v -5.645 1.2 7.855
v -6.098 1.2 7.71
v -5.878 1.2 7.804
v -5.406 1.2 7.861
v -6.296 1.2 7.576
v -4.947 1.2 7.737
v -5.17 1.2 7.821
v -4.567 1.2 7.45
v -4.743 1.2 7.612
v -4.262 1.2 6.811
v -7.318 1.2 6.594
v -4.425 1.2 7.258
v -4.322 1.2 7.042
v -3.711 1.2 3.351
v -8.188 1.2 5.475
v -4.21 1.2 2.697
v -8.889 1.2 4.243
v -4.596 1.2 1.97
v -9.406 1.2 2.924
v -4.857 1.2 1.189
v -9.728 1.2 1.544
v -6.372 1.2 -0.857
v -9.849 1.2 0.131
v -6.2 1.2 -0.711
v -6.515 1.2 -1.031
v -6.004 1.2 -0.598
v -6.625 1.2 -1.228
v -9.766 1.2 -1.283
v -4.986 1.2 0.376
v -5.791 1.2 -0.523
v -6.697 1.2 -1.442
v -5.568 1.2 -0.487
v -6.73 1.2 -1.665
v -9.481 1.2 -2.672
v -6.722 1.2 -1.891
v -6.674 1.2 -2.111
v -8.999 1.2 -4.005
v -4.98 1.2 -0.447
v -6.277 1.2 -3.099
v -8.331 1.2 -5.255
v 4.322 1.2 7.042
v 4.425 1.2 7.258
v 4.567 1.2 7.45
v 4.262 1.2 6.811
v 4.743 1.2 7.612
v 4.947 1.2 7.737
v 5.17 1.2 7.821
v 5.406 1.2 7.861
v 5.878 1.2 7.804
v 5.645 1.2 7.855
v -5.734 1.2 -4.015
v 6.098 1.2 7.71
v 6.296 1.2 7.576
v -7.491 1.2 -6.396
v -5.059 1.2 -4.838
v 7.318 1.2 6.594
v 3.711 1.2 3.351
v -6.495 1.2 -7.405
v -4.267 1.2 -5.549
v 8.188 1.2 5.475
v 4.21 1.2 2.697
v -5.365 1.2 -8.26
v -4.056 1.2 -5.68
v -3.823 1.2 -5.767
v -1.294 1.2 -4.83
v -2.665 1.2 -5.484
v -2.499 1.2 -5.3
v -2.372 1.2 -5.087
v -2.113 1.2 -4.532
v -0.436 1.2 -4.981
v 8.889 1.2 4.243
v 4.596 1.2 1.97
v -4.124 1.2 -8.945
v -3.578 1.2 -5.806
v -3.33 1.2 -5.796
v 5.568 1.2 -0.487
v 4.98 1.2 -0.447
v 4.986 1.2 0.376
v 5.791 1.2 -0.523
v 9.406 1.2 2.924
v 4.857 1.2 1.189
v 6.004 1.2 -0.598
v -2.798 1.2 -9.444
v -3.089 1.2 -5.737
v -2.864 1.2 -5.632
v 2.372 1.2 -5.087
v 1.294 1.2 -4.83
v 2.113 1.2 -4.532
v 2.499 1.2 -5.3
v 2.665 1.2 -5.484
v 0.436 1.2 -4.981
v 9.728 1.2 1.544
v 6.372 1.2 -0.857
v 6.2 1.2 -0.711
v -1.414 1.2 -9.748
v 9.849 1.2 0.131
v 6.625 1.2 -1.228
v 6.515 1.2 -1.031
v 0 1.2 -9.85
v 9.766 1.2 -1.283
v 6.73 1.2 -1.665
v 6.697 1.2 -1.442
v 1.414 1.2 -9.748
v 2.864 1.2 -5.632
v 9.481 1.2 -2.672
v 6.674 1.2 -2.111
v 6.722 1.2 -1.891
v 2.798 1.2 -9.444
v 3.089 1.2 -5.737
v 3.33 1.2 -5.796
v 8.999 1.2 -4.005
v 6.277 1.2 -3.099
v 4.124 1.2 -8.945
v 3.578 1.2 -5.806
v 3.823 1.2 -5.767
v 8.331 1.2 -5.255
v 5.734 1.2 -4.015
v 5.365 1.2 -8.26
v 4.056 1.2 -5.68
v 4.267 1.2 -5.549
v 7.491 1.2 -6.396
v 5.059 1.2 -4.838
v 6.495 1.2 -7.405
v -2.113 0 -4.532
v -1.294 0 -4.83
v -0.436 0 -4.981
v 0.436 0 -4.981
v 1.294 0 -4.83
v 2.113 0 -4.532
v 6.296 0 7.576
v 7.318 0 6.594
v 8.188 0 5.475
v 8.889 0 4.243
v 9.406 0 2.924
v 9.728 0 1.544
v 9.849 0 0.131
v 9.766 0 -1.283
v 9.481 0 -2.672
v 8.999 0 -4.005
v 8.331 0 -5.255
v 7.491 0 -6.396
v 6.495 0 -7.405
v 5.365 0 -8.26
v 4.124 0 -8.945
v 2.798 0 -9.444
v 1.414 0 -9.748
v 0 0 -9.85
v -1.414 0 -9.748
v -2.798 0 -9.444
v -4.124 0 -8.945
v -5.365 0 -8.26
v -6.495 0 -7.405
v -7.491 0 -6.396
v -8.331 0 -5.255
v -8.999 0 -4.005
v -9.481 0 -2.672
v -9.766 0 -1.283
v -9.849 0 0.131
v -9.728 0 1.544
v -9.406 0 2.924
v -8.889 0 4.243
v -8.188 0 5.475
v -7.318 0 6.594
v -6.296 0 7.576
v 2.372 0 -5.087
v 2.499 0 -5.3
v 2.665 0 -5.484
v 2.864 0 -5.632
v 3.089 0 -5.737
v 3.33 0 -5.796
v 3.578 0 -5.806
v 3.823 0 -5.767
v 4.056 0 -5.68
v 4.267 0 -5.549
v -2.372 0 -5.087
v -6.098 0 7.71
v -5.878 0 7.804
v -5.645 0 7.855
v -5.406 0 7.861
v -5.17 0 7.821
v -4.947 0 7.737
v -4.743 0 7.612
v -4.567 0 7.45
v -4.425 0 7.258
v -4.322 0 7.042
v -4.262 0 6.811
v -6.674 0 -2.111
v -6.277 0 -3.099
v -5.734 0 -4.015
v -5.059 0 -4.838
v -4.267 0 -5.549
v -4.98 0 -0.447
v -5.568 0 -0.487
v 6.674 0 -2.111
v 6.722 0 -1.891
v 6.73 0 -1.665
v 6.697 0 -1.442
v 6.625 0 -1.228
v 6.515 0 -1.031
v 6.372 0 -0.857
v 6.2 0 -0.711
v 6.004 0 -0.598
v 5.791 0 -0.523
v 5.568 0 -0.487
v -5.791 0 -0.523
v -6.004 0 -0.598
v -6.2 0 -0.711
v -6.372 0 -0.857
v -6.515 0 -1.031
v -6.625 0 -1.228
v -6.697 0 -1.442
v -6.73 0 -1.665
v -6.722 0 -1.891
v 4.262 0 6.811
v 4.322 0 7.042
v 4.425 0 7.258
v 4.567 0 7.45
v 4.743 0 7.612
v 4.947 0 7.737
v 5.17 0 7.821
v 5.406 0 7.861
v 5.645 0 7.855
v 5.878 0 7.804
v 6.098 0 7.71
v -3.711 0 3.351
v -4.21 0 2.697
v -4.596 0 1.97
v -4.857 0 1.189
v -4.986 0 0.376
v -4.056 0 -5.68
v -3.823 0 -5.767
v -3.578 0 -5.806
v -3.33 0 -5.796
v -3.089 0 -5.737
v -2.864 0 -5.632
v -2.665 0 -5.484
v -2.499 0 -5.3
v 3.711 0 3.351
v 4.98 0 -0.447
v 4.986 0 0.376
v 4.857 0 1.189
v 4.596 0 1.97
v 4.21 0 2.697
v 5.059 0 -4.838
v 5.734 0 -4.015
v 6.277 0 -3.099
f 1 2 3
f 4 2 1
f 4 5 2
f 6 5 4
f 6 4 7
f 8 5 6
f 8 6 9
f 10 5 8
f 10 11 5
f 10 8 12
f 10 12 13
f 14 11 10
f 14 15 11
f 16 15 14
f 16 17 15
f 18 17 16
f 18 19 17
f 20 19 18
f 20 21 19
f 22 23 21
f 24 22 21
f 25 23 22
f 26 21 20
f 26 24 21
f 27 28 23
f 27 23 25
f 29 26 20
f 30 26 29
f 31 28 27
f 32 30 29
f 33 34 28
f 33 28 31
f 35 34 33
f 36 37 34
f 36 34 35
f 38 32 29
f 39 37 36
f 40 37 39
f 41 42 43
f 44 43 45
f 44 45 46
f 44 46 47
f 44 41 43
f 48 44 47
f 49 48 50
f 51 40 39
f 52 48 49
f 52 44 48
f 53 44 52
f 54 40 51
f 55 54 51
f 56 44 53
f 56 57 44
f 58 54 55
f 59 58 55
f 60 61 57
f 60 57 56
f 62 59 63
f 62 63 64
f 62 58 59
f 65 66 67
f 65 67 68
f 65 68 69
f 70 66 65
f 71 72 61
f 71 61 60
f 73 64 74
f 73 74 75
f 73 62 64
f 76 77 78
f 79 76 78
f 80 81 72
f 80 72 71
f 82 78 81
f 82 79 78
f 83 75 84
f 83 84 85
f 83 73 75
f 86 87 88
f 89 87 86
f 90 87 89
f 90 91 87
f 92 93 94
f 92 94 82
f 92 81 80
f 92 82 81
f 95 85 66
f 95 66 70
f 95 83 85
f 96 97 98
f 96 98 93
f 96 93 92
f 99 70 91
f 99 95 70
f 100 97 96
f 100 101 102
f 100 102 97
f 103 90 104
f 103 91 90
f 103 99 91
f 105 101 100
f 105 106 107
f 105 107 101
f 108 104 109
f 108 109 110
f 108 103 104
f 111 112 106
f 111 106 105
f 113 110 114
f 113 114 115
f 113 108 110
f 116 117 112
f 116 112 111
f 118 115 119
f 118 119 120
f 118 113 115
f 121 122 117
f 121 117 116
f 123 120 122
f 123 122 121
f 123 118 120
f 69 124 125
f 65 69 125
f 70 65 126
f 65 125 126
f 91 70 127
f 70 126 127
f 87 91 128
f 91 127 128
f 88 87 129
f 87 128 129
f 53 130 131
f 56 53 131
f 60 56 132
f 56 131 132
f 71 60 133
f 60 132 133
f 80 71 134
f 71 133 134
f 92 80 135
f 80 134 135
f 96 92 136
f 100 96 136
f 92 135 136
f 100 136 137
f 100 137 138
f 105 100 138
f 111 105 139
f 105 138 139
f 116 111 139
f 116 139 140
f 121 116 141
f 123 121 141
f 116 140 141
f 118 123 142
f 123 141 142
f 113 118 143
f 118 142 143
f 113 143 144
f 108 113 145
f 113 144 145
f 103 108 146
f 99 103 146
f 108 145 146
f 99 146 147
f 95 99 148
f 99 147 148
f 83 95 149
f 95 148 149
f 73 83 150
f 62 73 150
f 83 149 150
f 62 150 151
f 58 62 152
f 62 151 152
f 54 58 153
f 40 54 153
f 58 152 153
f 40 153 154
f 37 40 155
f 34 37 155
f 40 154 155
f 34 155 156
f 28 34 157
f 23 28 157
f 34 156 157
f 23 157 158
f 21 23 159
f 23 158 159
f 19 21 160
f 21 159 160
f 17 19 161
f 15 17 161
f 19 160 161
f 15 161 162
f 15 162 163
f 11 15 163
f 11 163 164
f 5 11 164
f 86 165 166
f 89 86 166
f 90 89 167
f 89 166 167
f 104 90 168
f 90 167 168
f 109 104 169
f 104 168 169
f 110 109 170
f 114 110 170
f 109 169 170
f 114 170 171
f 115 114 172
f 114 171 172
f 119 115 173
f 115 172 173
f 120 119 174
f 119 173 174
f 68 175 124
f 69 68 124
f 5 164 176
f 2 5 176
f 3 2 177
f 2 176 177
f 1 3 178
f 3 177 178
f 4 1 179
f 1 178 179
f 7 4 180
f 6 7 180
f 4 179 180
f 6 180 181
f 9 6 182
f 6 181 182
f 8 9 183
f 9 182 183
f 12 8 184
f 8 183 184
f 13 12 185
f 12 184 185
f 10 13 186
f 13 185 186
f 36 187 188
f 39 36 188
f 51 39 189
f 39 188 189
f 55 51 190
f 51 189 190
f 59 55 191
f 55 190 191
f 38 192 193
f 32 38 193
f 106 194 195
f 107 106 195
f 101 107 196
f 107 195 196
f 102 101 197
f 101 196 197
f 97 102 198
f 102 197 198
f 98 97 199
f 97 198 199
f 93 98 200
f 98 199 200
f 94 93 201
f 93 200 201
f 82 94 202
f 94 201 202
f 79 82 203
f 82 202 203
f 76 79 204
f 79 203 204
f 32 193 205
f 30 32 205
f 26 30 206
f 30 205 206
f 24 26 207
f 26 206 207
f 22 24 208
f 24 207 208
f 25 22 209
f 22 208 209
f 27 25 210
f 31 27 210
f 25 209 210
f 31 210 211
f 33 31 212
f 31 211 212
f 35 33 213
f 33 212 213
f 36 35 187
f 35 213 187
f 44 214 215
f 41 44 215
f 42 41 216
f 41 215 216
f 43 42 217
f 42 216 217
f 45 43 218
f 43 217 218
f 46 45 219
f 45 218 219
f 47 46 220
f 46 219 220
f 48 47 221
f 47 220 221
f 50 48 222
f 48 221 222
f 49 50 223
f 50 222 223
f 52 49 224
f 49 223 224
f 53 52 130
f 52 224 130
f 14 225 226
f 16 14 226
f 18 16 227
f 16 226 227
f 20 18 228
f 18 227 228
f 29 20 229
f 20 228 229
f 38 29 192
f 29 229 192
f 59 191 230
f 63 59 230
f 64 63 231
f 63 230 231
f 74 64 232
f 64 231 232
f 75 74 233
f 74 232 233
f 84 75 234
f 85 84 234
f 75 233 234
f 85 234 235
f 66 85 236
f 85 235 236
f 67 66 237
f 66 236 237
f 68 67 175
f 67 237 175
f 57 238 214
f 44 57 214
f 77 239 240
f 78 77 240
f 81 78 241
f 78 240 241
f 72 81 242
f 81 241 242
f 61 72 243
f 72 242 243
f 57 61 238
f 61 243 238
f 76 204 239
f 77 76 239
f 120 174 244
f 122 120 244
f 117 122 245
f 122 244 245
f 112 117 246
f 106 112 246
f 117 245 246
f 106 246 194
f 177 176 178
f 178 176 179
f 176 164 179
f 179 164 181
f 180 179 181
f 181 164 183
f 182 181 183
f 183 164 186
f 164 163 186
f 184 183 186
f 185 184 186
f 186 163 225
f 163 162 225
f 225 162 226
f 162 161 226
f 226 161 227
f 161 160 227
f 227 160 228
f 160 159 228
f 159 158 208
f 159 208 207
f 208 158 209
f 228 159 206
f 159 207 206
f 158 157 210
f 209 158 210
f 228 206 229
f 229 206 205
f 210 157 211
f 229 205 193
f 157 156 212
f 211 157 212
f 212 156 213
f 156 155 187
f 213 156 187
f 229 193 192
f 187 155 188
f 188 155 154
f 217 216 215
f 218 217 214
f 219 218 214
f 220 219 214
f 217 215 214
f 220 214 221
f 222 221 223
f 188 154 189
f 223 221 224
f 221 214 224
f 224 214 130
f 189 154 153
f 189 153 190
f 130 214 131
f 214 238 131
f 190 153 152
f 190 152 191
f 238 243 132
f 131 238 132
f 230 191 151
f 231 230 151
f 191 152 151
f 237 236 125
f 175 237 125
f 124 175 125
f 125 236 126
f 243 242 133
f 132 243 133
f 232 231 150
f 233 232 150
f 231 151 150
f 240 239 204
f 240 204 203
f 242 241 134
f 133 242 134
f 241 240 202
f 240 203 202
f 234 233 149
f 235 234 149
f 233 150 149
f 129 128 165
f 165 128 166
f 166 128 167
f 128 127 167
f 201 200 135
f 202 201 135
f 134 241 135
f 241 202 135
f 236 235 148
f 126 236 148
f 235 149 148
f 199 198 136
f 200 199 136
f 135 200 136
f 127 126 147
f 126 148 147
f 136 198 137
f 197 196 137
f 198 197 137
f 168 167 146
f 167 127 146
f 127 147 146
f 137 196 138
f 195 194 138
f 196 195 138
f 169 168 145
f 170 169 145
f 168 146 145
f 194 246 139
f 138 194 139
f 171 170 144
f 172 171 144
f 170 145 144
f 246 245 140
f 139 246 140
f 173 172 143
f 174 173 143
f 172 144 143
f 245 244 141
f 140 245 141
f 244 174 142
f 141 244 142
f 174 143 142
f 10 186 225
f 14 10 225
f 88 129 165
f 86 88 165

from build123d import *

# Parameters (mm, degrees)
EXTRUDE1_DEPTH = 1.2


with BuildPart() as part:
    # Sketch1 → Extrude1 (new body)
    with BuildSketch(Plane(origin=(0, 0, 0), x_dir=(1, 0, 0), z_dir=(0, 1, 0))):
        with BuildLine():
            Line((2.113091309, 4.531538935), (2.371939111, 5.086639839))
            ThreePointArc((2.371939111, 5.086639839), (3.208308367, 5.77268928), (4.266742072, 5.549316362))
            ThreePointArc((4.266742072, 5.549316362), (5.73406431, 4.015035054), (6.673963371, 2.111448062))
            ThreePointArc((6.673963371, 2.111448062), (6.515398476, 1.030863961), (5.568082875, 0.487358691))
            Line((5.568082875, 0.487358691), (4.979992479, 0.446849981))
            ThreePointArc((4.979992479, 0.446849981), (4.742221478, -1.58471936), (3.710828514, -3.351082175))
            Line((3.710828514, -3.351082175), (4.262184676, -6.810891939))
            ThreePointArc((4.262184676, -6.810891939), (5.05662557, -7.784180304), (6.29553407, -7.575536336))
            ThreePointArc((6.29553407, -7.575536336), (0, 9.85), (-6.29553407, -7.575536336))
            ThreePointArc((-6.29553407, -7.575536336), (-5.05662557, -7.784180304), (-4.262184676, -6.810891939))
            Line((-4.262184676, -6.810891939), (-3.710828514, -3.351082175))
            ThreePointArc((-3.710828514, -3.351082175), (-4.742221478, -1.58471936), (-4.979992479, 0.446849981))
            Line((-4.979992479, 0.446849981), (-5.568082875, 0.487358691))
            ThreePointArc((-5.568082875, 0.487358691), (-6.515398476, 1.030863961), (-6.673963371, 2.111448062))
            ThreePointArc((-6.673963371, 2.111448062), (-5.73406431, 4.015035054), (-4.266742072, 5.549316362))
            ThreePointArc((-4.266742072, 5.549316362), (-3.208308367, 5.77268928), (-2.371939111, 5.086639839))
            Line((-2.371939111, 5.086639839), (-2.113091309, 4.531538935))
            ThreePointArc((-2.113091309, 4.531538935), (0, 5), (2.113091309, 4.531538935))
        make_face()
    extrude(amount=EXTRUDE1_DEPTH)


solid = part.part
